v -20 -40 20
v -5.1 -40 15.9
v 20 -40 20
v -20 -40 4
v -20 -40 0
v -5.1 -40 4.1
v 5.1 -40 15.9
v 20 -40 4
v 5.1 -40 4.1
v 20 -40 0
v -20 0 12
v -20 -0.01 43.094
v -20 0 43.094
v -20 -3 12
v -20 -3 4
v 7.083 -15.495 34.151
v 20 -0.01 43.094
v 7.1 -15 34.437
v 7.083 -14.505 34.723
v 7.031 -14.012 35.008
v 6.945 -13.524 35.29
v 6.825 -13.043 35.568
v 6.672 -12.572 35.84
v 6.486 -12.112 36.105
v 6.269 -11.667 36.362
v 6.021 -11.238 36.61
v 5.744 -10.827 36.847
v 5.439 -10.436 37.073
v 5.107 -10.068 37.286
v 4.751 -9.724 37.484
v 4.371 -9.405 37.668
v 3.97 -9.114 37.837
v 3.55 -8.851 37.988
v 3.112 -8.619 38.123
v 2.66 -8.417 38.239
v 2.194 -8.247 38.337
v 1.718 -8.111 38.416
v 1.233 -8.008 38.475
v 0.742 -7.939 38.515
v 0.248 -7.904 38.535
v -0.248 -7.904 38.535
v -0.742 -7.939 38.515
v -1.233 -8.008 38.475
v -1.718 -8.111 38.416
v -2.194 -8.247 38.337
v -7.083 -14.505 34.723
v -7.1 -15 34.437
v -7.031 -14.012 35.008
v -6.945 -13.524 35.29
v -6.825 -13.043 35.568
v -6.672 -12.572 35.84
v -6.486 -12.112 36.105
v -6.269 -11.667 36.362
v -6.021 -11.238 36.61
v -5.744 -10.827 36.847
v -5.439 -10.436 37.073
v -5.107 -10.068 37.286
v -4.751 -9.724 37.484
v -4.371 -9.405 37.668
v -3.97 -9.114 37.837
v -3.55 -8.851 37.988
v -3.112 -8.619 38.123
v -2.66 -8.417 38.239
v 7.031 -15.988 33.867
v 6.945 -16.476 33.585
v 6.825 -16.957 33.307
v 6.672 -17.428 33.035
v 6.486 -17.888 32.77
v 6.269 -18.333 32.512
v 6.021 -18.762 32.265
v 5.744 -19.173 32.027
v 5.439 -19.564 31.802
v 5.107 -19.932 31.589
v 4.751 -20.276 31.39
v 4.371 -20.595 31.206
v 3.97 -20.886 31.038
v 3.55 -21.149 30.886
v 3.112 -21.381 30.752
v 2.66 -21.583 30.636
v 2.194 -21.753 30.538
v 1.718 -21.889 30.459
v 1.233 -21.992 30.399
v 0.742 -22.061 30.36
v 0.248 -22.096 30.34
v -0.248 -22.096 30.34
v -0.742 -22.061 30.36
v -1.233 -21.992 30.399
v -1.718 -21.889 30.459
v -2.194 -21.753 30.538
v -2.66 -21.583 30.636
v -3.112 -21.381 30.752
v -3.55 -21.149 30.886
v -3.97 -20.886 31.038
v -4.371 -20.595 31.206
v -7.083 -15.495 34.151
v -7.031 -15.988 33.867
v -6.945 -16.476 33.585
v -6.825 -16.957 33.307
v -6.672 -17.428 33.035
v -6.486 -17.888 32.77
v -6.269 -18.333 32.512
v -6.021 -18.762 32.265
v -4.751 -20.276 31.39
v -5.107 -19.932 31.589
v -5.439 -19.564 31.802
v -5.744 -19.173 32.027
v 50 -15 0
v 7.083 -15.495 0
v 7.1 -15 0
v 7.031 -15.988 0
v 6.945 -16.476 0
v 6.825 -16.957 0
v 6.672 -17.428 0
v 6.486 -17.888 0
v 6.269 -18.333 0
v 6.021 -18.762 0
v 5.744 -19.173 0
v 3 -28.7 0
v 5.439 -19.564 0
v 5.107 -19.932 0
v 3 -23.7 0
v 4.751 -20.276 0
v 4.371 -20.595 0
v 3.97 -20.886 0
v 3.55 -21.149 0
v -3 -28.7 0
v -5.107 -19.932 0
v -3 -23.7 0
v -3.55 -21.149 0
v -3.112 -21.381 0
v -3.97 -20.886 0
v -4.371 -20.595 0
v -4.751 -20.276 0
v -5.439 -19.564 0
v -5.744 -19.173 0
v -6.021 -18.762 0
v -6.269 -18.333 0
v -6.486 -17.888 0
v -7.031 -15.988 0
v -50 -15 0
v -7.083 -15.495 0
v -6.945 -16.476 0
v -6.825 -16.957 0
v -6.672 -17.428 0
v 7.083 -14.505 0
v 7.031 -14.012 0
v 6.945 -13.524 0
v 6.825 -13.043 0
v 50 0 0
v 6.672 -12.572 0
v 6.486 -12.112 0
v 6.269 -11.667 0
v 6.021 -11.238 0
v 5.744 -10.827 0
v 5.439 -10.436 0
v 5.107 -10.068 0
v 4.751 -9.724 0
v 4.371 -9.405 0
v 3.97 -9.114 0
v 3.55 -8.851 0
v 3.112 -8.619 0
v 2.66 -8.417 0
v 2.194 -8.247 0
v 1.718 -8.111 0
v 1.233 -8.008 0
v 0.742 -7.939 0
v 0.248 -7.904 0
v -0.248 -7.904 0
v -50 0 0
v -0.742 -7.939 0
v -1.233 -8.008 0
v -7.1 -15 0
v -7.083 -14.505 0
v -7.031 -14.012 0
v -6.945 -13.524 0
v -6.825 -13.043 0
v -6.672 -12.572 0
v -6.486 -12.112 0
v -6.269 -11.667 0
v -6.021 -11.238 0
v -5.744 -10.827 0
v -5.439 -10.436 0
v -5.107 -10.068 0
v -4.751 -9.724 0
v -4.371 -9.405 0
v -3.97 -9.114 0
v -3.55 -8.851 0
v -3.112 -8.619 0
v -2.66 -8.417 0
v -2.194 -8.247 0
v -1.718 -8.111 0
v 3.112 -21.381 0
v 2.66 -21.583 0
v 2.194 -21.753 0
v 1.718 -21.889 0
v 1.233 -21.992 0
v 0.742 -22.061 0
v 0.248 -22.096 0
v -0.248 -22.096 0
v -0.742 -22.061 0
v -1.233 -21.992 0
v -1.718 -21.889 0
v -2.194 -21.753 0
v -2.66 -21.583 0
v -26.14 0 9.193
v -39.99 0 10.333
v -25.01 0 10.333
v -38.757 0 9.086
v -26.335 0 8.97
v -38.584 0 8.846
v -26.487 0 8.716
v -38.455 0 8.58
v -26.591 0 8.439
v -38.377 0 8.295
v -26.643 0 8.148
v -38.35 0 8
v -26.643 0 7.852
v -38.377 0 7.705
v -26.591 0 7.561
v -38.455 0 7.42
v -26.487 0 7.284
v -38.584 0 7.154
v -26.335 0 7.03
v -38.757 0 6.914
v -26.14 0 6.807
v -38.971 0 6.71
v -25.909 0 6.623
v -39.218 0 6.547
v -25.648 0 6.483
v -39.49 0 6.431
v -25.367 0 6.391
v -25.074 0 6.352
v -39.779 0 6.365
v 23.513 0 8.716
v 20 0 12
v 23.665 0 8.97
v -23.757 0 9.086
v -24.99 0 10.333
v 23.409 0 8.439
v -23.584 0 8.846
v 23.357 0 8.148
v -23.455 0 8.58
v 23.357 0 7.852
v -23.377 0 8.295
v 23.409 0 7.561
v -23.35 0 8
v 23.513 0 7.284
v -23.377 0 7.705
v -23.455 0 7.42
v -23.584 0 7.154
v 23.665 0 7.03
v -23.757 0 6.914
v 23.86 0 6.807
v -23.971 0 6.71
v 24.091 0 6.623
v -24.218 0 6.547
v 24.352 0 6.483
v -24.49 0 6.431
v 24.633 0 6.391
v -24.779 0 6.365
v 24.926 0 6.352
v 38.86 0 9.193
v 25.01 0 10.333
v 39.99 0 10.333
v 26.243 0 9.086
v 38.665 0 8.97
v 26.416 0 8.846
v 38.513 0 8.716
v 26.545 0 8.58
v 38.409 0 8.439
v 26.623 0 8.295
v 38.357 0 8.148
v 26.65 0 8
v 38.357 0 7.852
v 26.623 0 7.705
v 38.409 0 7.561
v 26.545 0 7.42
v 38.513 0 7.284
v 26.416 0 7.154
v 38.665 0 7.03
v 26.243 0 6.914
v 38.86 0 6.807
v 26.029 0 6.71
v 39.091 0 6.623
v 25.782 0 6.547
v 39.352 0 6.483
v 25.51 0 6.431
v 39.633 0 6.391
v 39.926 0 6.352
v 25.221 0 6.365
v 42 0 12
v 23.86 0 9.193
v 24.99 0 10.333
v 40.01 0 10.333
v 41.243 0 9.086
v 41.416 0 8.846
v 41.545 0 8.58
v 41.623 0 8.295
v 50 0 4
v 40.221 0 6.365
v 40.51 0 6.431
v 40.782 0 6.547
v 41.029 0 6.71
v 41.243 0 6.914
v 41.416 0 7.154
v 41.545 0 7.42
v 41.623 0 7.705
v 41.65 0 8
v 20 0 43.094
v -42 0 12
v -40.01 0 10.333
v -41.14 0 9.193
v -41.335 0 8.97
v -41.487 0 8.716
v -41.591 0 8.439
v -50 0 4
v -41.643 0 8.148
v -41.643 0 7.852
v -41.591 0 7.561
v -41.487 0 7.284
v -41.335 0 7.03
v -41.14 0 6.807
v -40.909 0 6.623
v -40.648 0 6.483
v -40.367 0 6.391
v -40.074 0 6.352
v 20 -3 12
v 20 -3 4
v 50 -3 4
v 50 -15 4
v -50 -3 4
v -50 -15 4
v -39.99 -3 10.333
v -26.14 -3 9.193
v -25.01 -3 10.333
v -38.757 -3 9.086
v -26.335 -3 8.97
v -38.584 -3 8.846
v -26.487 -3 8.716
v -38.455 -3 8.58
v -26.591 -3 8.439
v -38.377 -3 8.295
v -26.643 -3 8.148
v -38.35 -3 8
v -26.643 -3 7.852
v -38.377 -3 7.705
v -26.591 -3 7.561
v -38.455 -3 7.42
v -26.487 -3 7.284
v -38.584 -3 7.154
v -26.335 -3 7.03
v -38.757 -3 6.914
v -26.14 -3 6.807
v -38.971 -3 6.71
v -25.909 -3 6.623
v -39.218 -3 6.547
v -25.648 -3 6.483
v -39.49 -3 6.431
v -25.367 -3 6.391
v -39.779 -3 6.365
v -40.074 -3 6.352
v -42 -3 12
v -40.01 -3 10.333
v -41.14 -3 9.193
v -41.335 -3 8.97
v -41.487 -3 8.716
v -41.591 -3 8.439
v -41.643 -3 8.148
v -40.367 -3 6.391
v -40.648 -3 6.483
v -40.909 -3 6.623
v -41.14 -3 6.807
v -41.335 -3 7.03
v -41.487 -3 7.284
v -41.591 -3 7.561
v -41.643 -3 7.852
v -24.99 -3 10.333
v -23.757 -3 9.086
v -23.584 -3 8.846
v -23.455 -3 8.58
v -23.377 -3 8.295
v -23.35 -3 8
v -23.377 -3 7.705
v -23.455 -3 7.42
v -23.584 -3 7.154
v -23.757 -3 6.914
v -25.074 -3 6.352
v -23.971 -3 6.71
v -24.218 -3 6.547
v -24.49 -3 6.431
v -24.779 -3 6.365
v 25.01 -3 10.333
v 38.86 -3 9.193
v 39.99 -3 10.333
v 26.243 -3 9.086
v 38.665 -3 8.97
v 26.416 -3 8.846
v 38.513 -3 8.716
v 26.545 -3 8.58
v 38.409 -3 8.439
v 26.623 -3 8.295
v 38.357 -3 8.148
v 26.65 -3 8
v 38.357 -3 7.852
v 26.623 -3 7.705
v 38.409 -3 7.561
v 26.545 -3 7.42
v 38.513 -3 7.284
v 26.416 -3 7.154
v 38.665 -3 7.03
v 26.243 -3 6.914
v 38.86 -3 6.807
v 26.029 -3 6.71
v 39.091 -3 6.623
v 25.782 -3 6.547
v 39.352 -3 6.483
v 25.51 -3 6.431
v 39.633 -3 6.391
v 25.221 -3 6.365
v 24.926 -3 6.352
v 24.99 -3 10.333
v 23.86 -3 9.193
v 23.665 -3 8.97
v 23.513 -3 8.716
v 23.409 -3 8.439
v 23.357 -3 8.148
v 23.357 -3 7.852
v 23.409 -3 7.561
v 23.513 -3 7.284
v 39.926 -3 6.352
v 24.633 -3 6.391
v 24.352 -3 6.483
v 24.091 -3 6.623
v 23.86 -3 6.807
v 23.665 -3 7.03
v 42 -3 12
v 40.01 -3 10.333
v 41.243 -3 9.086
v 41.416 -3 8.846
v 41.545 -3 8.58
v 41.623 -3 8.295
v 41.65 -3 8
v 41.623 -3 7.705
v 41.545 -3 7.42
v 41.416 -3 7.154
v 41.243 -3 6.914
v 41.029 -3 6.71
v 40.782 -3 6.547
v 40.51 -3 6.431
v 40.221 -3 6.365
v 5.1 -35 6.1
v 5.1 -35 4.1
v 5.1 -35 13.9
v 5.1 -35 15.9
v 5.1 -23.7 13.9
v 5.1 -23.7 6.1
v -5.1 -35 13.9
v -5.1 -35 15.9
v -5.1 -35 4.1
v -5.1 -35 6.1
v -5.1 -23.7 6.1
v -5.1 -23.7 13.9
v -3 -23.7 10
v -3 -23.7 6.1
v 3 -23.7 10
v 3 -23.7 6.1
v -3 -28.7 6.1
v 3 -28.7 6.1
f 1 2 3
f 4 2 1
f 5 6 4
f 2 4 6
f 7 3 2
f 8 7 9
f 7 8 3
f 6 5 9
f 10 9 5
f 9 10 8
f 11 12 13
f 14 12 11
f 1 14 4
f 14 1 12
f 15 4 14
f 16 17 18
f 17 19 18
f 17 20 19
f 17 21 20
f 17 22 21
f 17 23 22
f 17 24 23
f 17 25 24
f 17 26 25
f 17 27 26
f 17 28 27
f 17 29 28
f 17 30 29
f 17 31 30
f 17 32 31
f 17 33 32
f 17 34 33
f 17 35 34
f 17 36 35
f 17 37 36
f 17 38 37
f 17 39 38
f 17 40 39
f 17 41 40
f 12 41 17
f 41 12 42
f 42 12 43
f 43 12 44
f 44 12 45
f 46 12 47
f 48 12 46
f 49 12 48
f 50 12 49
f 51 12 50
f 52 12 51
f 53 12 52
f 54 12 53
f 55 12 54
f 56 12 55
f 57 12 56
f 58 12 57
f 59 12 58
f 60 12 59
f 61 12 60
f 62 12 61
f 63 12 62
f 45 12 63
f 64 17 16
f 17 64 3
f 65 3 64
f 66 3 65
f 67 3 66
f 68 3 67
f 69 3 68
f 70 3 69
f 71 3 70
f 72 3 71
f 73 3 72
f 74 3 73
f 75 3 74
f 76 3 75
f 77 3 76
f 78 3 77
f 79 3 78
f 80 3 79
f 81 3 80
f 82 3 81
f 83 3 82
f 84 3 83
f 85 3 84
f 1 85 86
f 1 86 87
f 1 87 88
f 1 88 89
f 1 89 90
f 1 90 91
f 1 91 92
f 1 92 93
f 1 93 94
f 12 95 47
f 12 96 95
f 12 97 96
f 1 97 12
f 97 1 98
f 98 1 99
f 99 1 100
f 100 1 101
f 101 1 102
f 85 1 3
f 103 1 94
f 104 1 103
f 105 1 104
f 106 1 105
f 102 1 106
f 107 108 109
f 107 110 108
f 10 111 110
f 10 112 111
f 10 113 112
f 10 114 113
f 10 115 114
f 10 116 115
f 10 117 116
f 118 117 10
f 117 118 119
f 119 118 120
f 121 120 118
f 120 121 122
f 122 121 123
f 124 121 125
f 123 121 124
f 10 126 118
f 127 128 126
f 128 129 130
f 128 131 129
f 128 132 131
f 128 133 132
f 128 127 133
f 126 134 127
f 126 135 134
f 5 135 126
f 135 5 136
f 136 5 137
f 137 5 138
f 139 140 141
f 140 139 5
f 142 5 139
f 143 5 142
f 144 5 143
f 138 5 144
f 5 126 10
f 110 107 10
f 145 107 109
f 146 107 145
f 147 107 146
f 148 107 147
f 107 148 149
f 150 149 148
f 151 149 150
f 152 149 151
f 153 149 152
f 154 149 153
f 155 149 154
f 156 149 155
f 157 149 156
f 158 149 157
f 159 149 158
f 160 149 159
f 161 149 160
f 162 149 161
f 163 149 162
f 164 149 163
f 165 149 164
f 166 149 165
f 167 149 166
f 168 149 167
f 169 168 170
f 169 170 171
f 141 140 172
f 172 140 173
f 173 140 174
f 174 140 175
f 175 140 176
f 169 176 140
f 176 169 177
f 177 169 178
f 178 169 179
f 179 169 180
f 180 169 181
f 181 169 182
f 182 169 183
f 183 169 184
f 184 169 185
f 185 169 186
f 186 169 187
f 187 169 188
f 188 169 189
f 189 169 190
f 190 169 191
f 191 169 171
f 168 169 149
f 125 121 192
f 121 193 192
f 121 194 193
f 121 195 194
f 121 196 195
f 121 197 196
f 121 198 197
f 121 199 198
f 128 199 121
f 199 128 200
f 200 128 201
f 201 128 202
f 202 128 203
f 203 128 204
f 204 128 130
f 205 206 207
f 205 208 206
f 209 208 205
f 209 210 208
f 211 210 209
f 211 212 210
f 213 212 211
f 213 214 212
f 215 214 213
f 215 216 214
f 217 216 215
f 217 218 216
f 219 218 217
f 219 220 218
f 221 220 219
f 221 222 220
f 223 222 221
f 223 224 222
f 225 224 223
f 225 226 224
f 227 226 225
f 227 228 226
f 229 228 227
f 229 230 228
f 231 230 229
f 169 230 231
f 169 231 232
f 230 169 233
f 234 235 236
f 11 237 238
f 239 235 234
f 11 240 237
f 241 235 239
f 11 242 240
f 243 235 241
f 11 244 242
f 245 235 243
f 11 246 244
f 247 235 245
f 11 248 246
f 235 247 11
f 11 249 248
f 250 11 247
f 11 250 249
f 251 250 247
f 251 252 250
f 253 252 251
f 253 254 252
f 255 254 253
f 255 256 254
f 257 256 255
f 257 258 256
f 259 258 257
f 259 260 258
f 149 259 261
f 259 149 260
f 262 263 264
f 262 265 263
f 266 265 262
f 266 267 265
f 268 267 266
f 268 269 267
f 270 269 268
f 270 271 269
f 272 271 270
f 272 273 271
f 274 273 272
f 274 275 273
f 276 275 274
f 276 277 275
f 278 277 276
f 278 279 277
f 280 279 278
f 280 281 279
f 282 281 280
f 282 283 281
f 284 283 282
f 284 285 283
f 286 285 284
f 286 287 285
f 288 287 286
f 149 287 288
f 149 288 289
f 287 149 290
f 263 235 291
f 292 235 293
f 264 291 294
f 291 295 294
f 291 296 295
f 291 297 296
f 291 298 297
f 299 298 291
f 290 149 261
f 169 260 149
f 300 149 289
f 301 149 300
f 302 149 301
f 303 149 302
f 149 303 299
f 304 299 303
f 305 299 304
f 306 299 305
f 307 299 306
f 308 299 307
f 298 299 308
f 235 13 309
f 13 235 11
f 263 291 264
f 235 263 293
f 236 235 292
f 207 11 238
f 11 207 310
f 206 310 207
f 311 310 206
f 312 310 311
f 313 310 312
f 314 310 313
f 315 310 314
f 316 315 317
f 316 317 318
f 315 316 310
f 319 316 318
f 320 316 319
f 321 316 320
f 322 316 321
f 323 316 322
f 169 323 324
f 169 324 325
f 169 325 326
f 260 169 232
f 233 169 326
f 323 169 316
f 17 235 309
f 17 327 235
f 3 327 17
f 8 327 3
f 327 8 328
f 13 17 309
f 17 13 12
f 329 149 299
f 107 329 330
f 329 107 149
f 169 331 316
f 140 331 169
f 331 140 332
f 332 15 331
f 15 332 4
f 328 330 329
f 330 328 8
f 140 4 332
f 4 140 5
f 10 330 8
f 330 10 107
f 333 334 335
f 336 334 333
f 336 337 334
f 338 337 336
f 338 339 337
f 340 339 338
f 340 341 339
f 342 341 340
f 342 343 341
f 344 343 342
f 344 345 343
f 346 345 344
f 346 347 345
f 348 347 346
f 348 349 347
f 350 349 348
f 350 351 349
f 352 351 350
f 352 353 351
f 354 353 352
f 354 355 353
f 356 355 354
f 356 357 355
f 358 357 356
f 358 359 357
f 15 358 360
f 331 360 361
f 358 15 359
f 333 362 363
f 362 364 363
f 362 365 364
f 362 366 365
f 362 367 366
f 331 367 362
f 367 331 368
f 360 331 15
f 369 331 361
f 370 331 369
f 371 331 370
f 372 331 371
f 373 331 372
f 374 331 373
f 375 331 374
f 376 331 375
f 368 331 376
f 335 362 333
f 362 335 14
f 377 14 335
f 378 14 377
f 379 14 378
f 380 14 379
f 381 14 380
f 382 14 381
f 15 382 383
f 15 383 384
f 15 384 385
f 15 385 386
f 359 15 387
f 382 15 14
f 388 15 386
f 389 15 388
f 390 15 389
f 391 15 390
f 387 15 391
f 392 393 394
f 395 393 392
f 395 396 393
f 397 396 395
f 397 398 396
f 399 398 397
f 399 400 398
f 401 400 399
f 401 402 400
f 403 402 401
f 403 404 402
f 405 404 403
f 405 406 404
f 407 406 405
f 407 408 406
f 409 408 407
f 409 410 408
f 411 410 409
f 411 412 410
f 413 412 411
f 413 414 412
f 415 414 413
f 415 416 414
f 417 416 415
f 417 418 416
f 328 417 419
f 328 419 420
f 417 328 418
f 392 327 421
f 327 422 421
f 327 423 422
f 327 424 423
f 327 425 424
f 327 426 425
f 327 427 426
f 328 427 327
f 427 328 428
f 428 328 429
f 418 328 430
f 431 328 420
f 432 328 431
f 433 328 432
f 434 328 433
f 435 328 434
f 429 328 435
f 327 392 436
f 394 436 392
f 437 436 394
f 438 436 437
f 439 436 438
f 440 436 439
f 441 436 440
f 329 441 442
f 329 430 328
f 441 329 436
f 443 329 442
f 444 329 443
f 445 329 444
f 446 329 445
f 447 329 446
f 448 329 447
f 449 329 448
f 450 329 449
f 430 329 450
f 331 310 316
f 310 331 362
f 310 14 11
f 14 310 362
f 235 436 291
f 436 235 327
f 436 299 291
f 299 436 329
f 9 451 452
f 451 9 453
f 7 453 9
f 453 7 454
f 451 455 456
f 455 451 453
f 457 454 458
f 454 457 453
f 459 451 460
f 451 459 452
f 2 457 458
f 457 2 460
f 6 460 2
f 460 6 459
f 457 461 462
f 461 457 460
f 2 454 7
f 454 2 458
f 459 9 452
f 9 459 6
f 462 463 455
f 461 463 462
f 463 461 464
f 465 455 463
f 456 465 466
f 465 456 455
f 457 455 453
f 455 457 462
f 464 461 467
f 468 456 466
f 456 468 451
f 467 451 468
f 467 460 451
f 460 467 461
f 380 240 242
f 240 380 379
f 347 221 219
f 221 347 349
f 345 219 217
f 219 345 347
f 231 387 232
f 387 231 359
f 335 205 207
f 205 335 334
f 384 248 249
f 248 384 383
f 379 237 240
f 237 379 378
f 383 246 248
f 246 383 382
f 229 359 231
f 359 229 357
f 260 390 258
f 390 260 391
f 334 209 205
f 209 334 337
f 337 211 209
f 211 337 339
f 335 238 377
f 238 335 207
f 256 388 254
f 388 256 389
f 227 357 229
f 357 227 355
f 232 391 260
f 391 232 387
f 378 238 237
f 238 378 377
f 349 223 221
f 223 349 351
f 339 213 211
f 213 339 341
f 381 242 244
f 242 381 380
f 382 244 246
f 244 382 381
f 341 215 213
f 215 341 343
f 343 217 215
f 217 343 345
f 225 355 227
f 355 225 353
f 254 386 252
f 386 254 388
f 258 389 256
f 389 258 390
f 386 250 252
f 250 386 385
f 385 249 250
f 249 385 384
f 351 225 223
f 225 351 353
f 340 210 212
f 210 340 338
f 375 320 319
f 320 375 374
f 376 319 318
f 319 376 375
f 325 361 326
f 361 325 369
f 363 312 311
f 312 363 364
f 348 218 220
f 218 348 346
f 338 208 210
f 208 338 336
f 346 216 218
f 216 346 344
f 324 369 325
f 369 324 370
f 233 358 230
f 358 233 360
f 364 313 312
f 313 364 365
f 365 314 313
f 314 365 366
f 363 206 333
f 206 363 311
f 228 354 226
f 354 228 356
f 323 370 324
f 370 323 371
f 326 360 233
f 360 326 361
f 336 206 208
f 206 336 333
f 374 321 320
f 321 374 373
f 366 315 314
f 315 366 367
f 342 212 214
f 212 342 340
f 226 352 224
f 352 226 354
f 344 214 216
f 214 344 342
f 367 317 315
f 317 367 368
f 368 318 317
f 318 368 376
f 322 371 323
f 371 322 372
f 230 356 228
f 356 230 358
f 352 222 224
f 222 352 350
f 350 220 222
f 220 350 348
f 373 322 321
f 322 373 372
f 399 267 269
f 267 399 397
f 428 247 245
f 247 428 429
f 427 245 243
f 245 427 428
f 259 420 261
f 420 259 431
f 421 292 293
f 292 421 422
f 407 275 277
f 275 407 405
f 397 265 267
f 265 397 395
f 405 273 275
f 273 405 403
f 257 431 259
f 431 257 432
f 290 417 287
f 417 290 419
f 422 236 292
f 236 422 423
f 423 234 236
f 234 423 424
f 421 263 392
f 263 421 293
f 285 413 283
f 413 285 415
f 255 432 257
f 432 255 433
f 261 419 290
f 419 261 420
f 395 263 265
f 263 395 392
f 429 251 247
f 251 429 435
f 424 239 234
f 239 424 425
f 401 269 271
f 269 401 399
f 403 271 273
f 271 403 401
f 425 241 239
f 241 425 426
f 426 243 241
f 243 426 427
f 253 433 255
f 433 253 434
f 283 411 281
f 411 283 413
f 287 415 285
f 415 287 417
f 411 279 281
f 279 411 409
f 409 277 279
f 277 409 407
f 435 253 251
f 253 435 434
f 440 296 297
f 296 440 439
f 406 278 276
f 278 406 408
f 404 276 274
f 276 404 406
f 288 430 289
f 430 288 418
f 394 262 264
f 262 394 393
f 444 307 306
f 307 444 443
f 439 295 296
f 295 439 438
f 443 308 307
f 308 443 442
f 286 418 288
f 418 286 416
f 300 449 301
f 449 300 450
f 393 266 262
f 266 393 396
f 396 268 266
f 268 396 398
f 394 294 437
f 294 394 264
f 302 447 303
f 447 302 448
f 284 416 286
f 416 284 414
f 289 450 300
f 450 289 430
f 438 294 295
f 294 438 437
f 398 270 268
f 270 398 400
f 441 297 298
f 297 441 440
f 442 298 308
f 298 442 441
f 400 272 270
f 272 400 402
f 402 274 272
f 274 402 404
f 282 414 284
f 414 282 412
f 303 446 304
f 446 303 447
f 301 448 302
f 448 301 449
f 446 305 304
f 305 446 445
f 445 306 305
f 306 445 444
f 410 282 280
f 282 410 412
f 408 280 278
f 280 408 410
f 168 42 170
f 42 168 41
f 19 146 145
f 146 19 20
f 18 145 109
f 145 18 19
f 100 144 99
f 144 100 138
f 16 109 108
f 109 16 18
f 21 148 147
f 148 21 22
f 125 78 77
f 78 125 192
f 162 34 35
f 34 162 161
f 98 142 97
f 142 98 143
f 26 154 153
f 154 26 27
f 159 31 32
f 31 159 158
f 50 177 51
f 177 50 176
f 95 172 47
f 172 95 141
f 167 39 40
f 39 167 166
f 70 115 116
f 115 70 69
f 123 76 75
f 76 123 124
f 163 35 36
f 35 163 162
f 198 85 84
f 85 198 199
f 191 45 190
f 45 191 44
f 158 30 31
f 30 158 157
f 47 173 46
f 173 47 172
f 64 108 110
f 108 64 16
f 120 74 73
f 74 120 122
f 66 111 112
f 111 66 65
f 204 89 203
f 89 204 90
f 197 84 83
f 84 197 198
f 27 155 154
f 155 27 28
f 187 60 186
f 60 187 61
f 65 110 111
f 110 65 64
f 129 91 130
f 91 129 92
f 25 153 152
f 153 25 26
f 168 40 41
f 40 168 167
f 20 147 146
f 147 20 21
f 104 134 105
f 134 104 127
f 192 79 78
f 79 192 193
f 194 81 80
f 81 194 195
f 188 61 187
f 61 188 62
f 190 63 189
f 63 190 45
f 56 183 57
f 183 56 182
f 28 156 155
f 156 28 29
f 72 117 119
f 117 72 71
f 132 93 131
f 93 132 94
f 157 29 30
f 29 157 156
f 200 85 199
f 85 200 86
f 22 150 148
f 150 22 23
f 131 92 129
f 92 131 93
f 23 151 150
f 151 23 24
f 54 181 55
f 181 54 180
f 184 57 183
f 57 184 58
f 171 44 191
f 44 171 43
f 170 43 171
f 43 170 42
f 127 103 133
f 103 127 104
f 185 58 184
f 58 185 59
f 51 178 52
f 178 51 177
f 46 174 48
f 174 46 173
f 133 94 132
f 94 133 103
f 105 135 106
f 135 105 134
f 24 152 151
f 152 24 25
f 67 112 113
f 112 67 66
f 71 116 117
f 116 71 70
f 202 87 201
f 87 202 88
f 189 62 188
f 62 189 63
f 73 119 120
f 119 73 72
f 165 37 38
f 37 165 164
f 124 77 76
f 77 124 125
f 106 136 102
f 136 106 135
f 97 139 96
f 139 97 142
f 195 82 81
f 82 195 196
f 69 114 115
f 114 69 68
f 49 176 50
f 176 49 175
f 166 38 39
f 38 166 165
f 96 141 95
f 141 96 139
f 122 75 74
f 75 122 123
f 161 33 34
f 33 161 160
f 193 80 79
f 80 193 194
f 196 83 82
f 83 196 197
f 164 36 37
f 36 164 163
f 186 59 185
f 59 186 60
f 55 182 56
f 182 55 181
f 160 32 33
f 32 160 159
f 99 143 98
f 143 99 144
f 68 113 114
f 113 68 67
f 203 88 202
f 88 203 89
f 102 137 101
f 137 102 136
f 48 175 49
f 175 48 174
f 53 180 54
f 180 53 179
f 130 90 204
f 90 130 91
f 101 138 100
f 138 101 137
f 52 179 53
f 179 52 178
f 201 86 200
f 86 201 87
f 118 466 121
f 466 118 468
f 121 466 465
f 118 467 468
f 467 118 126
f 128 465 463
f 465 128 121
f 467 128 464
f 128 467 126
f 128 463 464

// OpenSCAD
// file: barrel.scad
// IR gun barrel: thick-wall tube, LED seated coaxially at the rear, held by a rear cap.
// Modeled in print orientation: axis on Z, muzzle on the bed at z = 0, rear at z = len.
// The LED goes in from the rear, its flange stops on a step, and the cap presses it there.

include <../lib/common.scad>
include <../lib/parts.scad>

barrel_len = 60;
barrel_bore_d = 5.0;
barrel_od = 14;
barrel_cap_d = 9;
barrel_cap_h = 3;
barrel_wire_slot = [4.0, 2.0];

function barrel_od() = barrel_od;

// Longer than the LED body so the flange, not the dome, is the stop.
led_seat_len = led_h - led_flange_h + 0.5;

module barrel(len = barrel_len, bore_d = barrel_bore_d, od = barrel_od, seat_cl = clearance) {
    assert(od - barrel_cap_d >= 2 * wall_min, "barrel wall around the cap is too thin");
    assert(len > barrel_cap_h + led_flange_h + led_seat_len + 5, "barrel too short for the LED seat");
    difference() {
        cylinder(d = od, h = len);
        barrel_bore(len, bore_d, seat_cl);
    }
}

// Kept separate so baffles or a muzzle aperture can be added here later.
module barrel_bore(len, bore_d, seat_cl) {
    flange_z = len - barrel_cap_h - led_flange_h;
    hole(bore_d, len, cl = 0);
    translate([0, 0, flange_z - led_seat_len]) cylinder(d = led_d + seat_cl, h = led_seat_len + eps);
    translate([0, 0, flange_z]) cylinder(d = led_flange_d + seat_cl, h = led_flange_h + eps);
    translate([0, 0, len - barrel_cap_h]) cylinder(d = barrel_cap_d + clearance, h = barrel_cap_h + eps);
}

// Printed flat side down; that face presses on the LED flange.
module barrel_cap() {
    difference() {
        cylinder(d = barrel_cap_d, h = barrel_cap_h);
        translate([0, 0, barrel_cap_h / 2])
            cube([barrel_wire_slot.x, barrel_wire_slot.y, barrel_cap_h + 1], center = true);
    }
}

barrel();
translate([barrel_od + 5, 0, 0]) barrel_cap();
// file: ../lib/parts.scad
// Off-the-shelf part sizes and simple ghost models for previews. Units mm.
// docs/measurements.md is the source of truth for every value here, with its source
// and status. Change both together. "unverified" values are not final.

// Mounted with the long axis horizontal and the 22.3 width vertical.
// Local frame of tt_motor_ghost(): shaft on the X axis, gearbox end towards -Y.
tt_len = 64.4;
tt_w = 22.3;
tt_clip_w = 22.6;
tt_t = 18.7;
tt_shaft_from_end = 11.0;
tt_shaft_d = 5.4;
tt_shaft_len = 9.1;
tt_boss_d = 5.5;
tt_hole_d = 2.8;
// [along length from shaft, across width from shaft]
tt_holes = [[20.1, 8.85], [20.1, -8.85], [-13.4, 0]];
tt_tab_len = 5.0;
tt_tab_w = 5.7;
// Round peg on the gearbox side, estimated from the drawing scale.
tt_peg = [11.2, 0];
tt_peg_d = 4.0;
tt_top_above_axle = max(tt_w, tt_clip_w) / 2;

wheel_d = 65;
wheel_w = 26;

caster_h = 35;
caster_wheel_d = 25;
caster_hole_d = 5;
caster_hole_spacing = [28, 23];
caster_plate = [40, 34];
caster_plate_t = 2;

// Plate underside height; the caster must reach the same height. Recompute after
// measuring wheel_d, tt_top_above_axle, motor_top_gap and caster_h.
// On the prototype an aluminium angle flange sits between plate and motor (photo
// estimate). The gap also keeps the top motor nut trap clear of the plate.
motor_top_gap = 2;
plate_underside_h = wheel_d / 2 + tt_top_above_axle + motor_top_gap;
caster_spacer_h = plate_underside_h - caster_h;

led_d = 5.0;
led_flange_d = 5.8;
led_flange_h = 1.0;
led_h = 8.6;
led_lead_pitch = 2.54;

// IR receivers: [body w, body h, depth incl. lens, lens centre above body bottom,
//     outer pin spacing, pins from back face]
tsop1730 = [10.0, 12.5, 5.8, 9.2, 7.62, 1.4];
// Upgrade option only (docs/hardware-upgrades.md). Lens height and pin offset are guesses.
tsop38238 = [5.0, 6.95, 4.8, 4.5, 5.08, 1.0];
function tsop_w(t) = t[0];
function tsop_h(t) = t[1];
function tsop_depth(t) = t[2];
function tsop_lens_h(t) = t[3];
function tsop_pin_span(t) = t[4];
function tsop_pin_back(t) = t[5];

btn_hole_d = 24;
btn_bezel_d = 30;
btn_above_panel = 10;
btn_depth = 33;
btn_nut_d = 30;

switch_body = [8.6, 3.6, 3.5];
switch_lever = [2.0, 2.0, 4.0];
switch_travel = 2.0;

cell_d = 18.5;
cell_len = 65.2;

joystick_cap_top = 32;
joystick_cap_d = 25;

// Height above the PCB top per Eagle package, for previews and clearance.
pcb_part_heights = [
    ["KEYSTONE_1049_DUAL_18650_HOLDER", 20],
    ["SINGLE_18650_HOLDER", 20],
    ["NRF24L01+", 13],
    ["NANO", 11],
    ["BA56-12EWA", 8],
    ["DIL14", 7],
    ["DIL16", 7],
    ["F/CM12P", 9.5],
    ["JOYSTICK-2AXIS-BUTTON", 17],
    ["DC-DC-STEP-UP-5V", 7],
    ["TL3XPO", 3.5],
];
function pcb_part_height(package) =
    let(i = search([package], pcb_part_heights)[0])
    is_num(i) ? pcb_part_heights[i][1] : 3;

module tt_motor_ghost() {
    color("gold") {
        translate([-tt_t / 2, -tt_shaft_from_end, -tt_w / 2]) cube([tt_t, tt_len, tt_w]);
        translate([0, -tt_shaft_from_end - tt_tab_len, 0])
            cube([3, 2 * tt_tab_len, tt_tab_w], center = true);
    }
    color("white") rotate([0, 90, 0])
        cylinder(d = tt_shaft_d, h = tt_t + 2 * tt_shaft_len, center = true);
}

module wheel_ghost() {
    color("dimgray") rotate([0, 90, 0]) cylinder(d = wheel_d, h = wheel_w, center = true);
}

// Top of the mounting plate at z = 0, wheel on the ground at z = -caster_h.
module caster_ghost() {
    color("white") {
        translate([0, 0, -caster_plate_t / 2]) cube([caster_plate.x, caster_plate.y, caster_plate_t], center = true);
        translate([0, 0, -caster_h + caster_wheel_d / 2]) rotate([0, 90, 0])
            cylinder(d = caster_wheel_d, h = 10, center = true);
        translate([-8, -4, -caster_h + caster_wheel_d / 2]) cube([16, 8, caster_h - caster_wheel_d / 2]);
    }
}

// Body bottom at z = 0, lens facing +Y.
module tsop_ghost(t = tsop1730) {
    color("black") translate([-tsop_w(t) / 2, 0, 0]) cube([tsop_w(t), tsop_depth(t), tsop_h(t)]);
    color("red") translate([0, tsop_depth(t), tsop_lens_h(t)]) sphere(1);
}

// Two receivers glued back to back, as on the prototype: one lens +Y, one -Y.
module tsop_pair_ghost(t = tsop1730) {
    tsop_ghost(t);
    rotate([0, 0, 180]) tsop_ghost(t);
}

// Flange bottom at z = 0, pointing +Z.
module led_ghost() {
    color("lightblue") {
        cylinder(d = led_flange_d, h = led_flange_h);
        cylinder(d = led_d, h = led_h - led_d / 2);
        translate([0, 0, led_h - led_d / 2]) sphere(d = led_d);
    }
}

// Panel front face at z = 0, button pointing +Z.
module arcade_button_ghost() {
    color("crimson") cylinder(d = btn_bezel_d, h = btn_above_panel);
    color("gray") translate([0, 0, -btn_depth]) cylinder(d = btn_hole_d - 1, h = btn_depth);
}

// PCB from a generated pcb_*.scad table with footprint boxes as part ghosts.
// Bottom of the PCB at z = 0. Parts named in flat_parts are only wire connection
// points on this PCB (the real part sits elsewhere) and are drawn flat.
module pcb_ghost(outline, holes, parts, flat_parts = []) {
    color("darkgreen") difference() {
        linear_extrude(pcb_thickness) polygon(outline);
        for (h = holes) translate([h[1], h[2], 0]) hole(h[3], pcb_thickness, cl = 0);
    }
    for (p = parts) {
        box = p[7];
        h = is_num(search([p[0]], flat_parts)[0]) ? 0.3 : pcb_part_height(p[1]);
        color(h > 15 ? "black" : "steelblue", 0.8)
            translate([box[0], box[1], pcb_thickness]) cube([box[2] - box[0], box[3] - box[1], h]);
    }
}
// file: ../lib/common.scad
// Shared print, fastener and helper definitions. Units mm.

$fa = 4;
$fs = 0.3;

eps = 0.01;

// Added to the diameter of holes, seats and press fits. Tune after the test prints.
clearance = 0.2;
wall_min = 1.6;
layer_h = 0.2;
bed_size = [180, 180, 180];

pcb_thickness = 1.6;
base_plate_t = 3;
// Under the PCB for through-hole leads and solder. Set from the vehicle PCB, see docs/measurements.md.
pcb_standoff_h = 2;

// ISO 4032 nuts, nominal.
m3_d = 3;
m3_nut_af = 5.5;
m3_nut_h = 2.4;
// From test/m3_fit (screw hole column 3, nut trap column 4).
m3_cl = 0.3;
m3_nut_cl = 0.4;
// Plate left above a nut trapped in the base plate bottom, so the nut does not pull
// through; the nut sticks out below the plate by the rest.
nut_roof = 1;

label_font = "Liberation Sans:style=Bold";

// Vertical hole from z = 0 to z = h.
module hole(d, h, cl = clearance) {
    translate([0, 0, -eps]) cylinder(d = d + cl, h = h + 2 * eps);
}

// Hex pocket from z = 0 to z = h, two flats parallel to X.
module nut_trap(af, h, cl = clearance) {
    translate([0, 0, -eps]) rotate([0, 0, 30])
        cylinder(d = (af + cl) / cos(30), h = h + eps, $fn = 6);
}

// Hole along +Y from y = 0 to y = h with a 45 deg roof pointing +Z,
// so it prints without support when the part's +Z is up on the printer.
module teardrop(d, h, cl = clearance) {
    r = (d + cl) / 2;
    rotate([90, 0, 0]) translate([0, 0, -h - eps])
        linear_extrude(h + 2 * eps) hull() {
            circle(r);
            translate([0, r * sqrt(2) - eps]) square(2 * eps, center = true);
        }
}

// Engraved label, top face at z = 0.
module label(txt, size = 4, depth = 0.6) {
    translate([0, 0, -depth]) linear_extrude(depth + eps)
        text(txt, size = size, font = label_font, halign = "center", valign = "center");
}

// Row from the generated pcb_*.scad parts table by element name.
function pcb_part(parts, name) = parts[search([name], parts)[0]];
// main file
// Gun block: raked block with the barrel bore, the TSOP pair seat on top and the wall
// as its rear part. Modeled in assembly orientation: x = 0 on the barrel axis, y = 0
// at the wall rear face, z = 0 on the base plate top. Printed on the wall rear face,
// so the barrel bore is vertical and round.
// The barrel slides in from the front until its rear end is flush with the wall rear
// face (press the block rear on the table). It is held by friction (barrel_fit_cl).

include <../lib/common.scad>
include <../lib/parts.scad>
use <barrel.scad>

// As wide as the caster spacer below the plate, so the two read as one nose.
block_w = caster_plate.x;
block_h = 40;
// Flat top for the TSOP pair, from the wall rear face; the front face leans back by block_rake.
block_top_len = 20;
block_rake = 30;
// Wall: full plate width, sides sloping down to wall_side_h.
wall_w = 100;
wall_t = 4;
wall_side_h = 15;
// Foot on the plate for the M3 screws; nuts go under the base plate.
flange_t = 3;
flange_len = 12;
flange_front_w = 84;
flange_hole_x = [25, 40];
flange_hole_y = 8;
barrel_axis_z = 15;
barrel_fit_cl = 0.2;
tsop = tsop1730;
tsop_seat_depth = 5;
// Under the lens ends of the pair; the bodies rest on it, the legs go down between.
tsop_ledge = 2;
// [width, height] of the wire channel from the TSOP legs out of the wall rear face.
tsop_wire_channel = [6, 5];
// Dome radius is 2.75; the whole lens must stay above the block top.
min_lens_above_top = 3.5;

block_len = block_top_len + block_h * tan(block_rake);
bore_d = barrel_od() + barrel_fit_cl;
tsop_y = block_top_len / 2;
tsop_floor_z = block_h - tsop_seat_depth;
wire_z = barrel_axis_z + bore_d / 2 + wall_min;

function gun_block_len() = block_len;
function gun_block_wall_w() = wall_w;
function gun_block_wall_t() = wall_t;
function gun_block_barrel_z() = barrel_axis_z;
function gun_block_tsop_seat() = [0, tsop_y, tsop_floor_z];
function gun_block_holes() = [for (sx = [-1, 1], x = flange_hole_x) [sx * x, flange_hole_y]];

assert(tsop_lens_h(tsop) - tsop_seat_depth >= min_lens_above_top, "TSOP seat too deep, lens would be covered");
assert(tsop_y + (2 * tsop_depth(tsop) + clearance) / 2 + wall_min <= block_top_len, "TSOP pocket does not fit the flat top");
assert(bore_d + 2 * wall_min <= block_w, "block too narrow for the barrel");
assert(barrel_axis_z - bore_d / 2 >= wall_min, "barrel bore too low");
assert(wire_z + tsop_wire_channel.y <= tsop_floor_z - wall_min, "no room for the TSOP wires above the barrel");
echo(block_len = block_len, tsop_legs_max = tsop_floor_z - wire_z, lens_above_top = tsop_lens_h(tsop) - tsop_seat_depth);

// Top face at z = 0, pair centred on the origin, legs straight down into the cavity.
module tsop_seat_cut(t = tsop, depth = tsop_seat_depth, cavity_h = 10, ledge = tsop_ledge) {
    pocket = [tsop_w(t) + clearance, 2 * tsop_depth(t) + clearance];
    cavity = [pocket.x, pocket.y - 2 * ledge];
    assert(tsop_pin_back(t) + 0.5 <= cavity.y / 2, "ledge covers the legs");
    translate([-pocket.x / 2, -pocket.y / 2, -depth]) cube([pocket.x, pocket.y, depth + eps]);
    translate([-cavity.x / 2, -cavity.y / 2, -depth - cavity_h]) cube([cavity.x, cavity.y, cavity_h + eps]);
}

module gun_block() {
    difference() {
        union() {
            hull() {
                translate([-block_w / 2, 0, 0]) cube([block_w, block_len, eps]);
                translate([-block_w / 2, 0, block_h - eps]) cube([block_w, block_top_len, eps]);
            }
            translate([0, wall_t, 0]) rotate([90, 0, 0]) linear_extrude(wall_t) polygon([
                [-wall_w / 2, 0], [wall_w / 2, 0], [wall_w / 2, wall_side_h],
                [block_w / 2, block_h], [-block_w / 2, block_h], [-wall_w / 2, wall_side_h],
            ]);
            linear_extrude(flange_t) polygon([
                [-wall_w / 2, 0], [wall_w / 2, 0], [wall_w / 2, wall_t],
                [flange_front_w / 2, flange_len], [-flange_front_w / 2, flange_len], [-wall_w / 2, wall_t],
            ]);
        }
        translate([0, -eps, barrel_axis_z]) rotate([-90, 0, 0]) cylinder(d = bore_d, h = block_len + 2 * eps);
        translate([0, tsop_y, block_h]) tsop_seat_cut(cavity_h = tsop_floor_z - wire_z);
        translate([-tsop_wire_channel.x / 2, -eps, wire_z]) cube([tsop_wire_channel.x, tsop_y + eps, tsop_wire_channel.y]);
        // Teardrop tip points +Y, which is up when printed on the wall rear face.
        for (sx = [-1, 1], x = flange_hole_x)
            translate([sx * x, flange_hole_y, flange_t]) rotate([-90, 0, 0]) teardrop(m3_d, flange_t, m3_cl);
    }
}

rotate([90, 0, 0]) gun_block();
